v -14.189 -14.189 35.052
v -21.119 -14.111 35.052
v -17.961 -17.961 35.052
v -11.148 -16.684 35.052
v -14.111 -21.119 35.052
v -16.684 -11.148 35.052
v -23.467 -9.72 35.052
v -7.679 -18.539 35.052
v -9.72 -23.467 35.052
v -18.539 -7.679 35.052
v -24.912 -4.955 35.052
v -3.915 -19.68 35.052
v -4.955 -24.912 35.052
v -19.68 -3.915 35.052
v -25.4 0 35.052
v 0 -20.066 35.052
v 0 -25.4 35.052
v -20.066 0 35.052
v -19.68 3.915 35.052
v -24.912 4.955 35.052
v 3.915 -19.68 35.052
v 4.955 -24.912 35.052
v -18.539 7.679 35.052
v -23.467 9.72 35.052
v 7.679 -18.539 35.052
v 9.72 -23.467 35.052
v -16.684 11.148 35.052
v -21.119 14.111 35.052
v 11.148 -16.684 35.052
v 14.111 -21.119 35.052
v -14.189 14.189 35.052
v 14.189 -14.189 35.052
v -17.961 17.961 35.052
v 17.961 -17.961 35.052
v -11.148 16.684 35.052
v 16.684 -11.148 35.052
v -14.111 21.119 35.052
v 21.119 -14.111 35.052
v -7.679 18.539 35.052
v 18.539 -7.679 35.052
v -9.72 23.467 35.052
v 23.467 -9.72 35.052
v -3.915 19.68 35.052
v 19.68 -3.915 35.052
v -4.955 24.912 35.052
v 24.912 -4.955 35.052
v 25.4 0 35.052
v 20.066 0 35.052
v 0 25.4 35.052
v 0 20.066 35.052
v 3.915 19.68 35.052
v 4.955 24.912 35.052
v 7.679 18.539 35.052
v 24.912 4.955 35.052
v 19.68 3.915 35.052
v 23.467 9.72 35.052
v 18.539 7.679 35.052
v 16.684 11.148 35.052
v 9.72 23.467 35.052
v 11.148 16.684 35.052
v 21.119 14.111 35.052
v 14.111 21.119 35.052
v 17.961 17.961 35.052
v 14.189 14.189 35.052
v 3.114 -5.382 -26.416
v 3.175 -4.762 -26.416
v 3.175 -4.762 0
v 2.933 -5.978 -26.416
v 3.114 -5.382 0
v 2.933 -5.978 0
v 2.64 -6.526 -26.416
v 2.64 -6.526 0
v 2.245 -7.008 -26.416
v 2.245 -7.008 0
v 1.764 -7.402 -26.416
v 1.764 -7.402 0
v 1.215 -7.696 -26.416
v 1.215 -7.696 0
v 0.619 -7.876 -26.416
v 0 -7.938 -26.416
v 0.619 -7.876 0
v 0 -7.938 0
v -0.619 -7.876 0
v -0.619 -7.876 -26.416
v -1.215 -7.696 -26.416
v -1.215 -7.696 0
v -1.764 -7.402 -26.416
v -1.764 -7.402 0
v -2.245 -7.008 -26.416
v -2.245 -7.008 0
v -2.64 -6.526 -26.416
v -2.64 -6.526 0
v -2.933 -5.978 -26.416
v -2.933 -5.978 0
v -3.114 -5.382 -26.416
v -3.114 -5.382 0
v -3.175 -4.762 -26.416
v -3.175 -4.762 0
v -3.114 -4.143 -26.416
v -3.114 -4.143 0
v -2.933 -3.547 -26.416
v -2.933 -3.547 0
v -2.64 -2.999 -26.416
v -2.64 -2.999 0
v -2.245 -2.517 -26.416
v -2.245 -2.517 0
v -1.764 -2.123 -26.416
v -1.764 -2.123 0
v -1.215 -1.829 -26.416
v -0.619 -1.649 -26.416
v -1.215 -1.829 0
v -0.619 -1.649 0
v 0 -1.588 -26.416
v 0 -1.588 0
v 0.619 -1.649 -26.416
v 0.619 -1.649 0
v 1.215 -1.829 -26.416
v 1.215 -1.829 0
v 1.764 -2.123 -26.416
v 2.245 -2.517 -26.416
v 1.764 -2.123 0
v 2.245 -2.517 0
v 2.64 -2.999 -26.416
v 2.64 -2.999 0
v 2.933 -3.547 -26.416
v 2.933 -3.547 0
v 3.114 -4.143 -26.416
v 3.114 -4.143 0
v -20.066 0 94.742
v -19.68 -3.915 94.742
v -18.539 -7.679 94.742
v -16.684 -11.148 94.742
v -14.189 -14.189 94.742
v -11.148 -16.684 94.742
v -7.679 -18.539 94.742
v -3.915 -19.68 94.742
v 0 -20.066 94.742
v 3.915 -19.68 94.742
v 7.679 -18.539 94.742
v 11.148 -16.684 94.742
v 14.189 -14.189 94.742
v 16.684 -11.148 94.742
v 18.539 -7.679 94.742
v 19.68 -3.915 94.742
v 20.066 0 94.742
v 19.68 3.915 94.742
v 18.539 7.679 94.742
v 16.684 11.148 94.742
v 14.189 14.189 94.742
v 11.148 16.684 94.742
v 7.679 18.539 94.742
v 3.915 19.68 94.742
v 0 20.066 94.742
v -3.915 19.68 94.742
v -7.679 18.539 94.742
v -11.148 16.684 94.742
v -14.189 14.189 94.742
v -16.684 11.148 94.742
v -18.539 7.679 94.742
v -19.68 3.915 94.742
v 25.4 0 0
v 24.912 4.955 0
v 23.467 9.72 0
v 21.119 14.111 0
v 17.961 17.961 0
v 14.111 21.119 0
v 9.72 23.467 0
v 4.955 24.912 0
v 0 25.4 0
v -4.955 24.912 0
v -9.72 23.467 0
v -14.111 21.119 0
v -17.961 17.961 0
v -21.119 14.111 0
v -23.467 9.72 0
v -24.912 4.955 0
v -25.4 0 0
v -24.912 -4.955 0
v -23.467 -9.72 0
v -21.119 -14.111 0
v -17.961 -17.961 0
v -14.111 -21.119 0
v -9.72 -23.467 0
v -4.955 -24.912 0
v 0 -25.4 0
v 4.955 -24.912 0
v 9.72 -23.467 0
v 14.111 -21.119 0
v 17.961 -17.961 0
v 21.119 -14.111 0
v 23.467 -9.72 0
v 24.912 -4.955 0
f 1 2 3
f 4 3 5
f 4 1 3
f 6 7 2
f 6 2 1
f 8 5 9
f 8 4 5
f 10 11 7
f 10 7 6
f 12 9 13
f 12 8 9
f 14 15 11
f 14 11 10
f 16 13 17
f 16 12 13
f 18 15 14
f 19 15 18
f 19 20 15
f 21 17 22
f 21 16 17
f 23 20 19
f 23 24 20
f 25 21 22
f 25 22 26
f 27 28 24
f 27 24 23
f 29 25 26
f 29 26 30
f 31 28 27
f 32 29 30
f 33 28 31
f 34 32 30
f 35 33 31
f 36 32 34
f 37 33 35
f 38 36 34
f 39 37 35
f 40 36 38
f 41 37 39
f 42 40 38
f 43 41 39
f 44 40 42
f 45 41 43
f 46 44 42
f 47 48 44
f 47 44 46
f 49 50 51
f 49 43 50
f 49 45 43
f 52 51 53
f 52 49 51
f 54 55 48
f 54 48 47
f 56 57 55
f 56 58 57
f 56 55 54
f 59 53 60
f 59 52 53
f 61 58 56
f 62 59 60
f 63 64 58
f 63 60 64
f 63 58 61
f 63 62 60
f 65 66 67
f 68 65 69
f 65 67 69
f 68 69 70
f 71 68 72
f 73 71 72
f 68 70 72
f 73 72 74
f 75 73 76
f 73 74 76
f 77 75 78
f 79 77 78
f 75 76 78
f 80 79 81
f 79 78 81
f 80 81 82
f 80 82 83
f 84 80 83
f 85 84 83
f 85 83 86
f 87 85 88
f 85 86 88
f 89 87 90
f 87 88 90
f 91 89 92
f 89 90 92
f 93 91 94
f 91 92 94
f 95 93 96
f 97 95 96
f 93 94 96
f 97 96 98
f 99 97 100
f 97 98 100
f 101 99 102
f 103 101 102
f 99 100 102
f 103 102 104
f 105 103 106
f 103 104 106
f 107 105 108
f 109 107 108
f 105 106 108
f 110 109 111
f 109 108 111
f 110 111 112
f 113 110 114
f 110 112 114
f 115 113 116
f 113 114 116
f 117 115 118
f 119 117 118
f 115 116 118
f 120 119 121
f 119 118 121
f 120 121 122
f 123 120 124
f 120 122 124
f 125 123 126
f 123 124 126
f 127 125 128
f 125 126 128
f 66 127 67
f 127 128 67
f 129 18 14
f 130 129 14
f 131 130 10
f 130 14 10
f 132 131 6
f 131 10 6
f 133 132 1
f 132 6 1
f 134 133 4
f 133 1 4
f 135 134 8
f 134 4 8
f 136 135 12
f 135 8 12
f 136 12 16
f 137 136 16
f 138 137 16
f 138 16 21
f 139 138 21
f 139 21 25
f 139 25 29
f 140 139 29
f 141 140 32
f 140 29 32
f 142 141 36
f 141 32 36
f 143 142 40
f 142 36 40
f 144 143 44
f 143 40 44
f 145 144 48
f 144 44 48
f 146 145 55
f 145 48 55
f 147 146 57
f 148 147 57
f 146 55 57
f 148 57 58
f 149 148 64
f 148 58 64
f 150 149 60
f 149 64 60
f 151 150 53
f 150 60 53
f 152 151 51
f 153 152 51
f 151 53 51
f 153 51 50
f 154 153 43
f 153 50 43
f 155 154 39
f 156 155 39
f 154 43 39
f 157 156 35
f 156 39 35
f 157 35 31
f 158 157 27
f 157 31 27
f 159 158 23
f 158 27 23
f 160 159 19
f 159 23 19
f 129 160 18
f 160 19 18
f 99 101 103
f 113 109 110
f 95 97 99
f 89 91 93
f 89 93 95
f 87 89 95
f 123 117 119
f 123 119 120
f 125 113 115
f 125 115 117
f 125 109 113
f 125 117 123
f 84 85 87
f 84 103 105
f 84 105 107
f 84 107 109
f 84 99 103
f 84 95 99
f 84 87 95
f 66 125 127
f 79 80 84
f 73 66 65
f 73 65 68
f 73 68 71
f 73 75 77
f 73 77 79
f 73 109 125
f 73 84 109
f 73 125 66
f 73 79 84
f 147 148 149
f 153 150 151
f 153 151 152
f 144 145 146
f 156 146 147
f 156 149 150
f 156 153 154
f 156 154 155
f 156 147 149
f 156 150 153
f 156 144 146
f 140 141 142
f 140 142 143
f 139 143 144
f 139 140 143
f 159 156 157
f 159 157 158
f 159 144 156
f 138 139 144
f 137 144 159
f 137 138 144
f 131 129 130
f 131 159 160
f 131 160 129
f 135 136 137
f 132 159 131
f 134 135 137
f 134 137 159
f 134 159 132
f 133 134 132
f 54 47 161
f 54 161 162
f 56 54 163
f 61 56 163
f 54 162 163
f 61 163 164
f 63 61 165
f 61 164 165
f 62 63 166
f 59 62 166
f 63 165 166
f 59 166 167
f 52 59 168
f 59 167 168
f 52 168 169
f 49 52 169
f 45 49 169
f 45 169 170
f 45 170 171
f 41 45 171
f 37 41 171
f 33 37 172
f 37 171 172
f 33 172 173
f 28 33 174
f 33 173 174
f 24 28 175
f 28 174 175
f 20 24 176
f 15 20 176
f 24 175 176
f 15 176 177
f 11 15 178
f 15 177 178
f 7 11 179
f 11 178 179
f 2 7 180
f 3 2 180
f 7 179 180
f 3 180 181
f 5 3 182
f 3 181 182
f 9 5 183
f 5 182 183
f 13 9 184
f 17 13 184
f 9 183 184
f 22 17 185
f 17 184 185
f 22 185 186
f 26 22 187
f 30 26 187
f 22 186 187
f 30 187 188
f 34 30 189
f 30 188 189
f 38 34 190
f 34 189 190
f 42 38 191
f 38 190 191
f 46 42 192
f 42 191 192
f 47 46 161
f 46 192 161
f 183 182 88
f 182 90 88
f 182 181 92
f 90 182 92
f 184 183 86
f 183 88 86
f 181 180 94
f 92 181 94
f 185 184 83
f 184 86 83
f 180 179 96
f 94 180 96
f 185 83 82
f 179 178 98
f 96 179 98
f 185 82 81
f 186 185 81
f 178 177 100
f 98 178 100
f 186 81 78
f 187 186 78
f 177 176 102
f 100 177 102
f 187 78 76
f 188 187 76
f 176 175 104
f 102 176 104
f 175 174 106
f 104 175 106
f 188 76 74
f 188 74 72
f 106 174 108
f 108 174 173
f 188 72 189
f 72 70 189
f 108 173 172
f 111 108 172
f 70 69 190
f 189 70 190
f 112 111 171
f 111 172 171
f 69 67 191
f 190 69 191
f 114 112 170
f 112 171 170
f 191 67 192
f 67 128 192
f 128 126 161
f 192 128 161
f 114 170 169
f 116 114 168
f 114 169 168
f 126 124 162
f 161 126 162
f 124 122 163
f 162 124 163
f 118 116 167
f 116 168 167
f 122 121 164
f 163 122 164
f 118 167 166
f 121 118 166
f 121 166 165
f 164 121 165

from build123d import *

# Parameters (mm, degrees)
SKETCH1_R           = 25.4
BOSS_EXTRUDE1_DEPTH = 35.052
SKETCH2_R           = 20.066
BOSS_EXTRUDE2_DEPTH = 59.69
SKETCH3_R           = 3.175
BOSS_EXTRUDE3_DEPTH = 26.416


with BuildPart() as part:
    # Sketch1 → Boss-Extrude1 (new body)
    with BuildSketch(Plane.XY):
        Circle(SKETCH1_R)
    extrude(amount=BOSS_EXTRUDE1_DEPTH)

    # Sketch2 → Boss-Extrude2 (add)
    with BuildSketch(Plane.XY.offset(35.052)):
        with Locations(Location((0, 0, 0), (0, 0, 180))):
            Circle(SKETCH2_R)
    extrude(amount=BOSS_EXTRUDE2_DEPTH)

    # Sketch3 → Boss-Extrude3 (add)
    with BuildSketch(Plane(origin=(0, 0, 0), x_dir=(-1, 0, 0), z_dir=(0, 0, -1))):
        with Locations(Location((0, -4.7625, 0), (0, 0, 180))):
            Circle(SKETCH3_R)
    extrude(amount=BOSS_EXTRUDE3_DEPTH)


solid = part.part
